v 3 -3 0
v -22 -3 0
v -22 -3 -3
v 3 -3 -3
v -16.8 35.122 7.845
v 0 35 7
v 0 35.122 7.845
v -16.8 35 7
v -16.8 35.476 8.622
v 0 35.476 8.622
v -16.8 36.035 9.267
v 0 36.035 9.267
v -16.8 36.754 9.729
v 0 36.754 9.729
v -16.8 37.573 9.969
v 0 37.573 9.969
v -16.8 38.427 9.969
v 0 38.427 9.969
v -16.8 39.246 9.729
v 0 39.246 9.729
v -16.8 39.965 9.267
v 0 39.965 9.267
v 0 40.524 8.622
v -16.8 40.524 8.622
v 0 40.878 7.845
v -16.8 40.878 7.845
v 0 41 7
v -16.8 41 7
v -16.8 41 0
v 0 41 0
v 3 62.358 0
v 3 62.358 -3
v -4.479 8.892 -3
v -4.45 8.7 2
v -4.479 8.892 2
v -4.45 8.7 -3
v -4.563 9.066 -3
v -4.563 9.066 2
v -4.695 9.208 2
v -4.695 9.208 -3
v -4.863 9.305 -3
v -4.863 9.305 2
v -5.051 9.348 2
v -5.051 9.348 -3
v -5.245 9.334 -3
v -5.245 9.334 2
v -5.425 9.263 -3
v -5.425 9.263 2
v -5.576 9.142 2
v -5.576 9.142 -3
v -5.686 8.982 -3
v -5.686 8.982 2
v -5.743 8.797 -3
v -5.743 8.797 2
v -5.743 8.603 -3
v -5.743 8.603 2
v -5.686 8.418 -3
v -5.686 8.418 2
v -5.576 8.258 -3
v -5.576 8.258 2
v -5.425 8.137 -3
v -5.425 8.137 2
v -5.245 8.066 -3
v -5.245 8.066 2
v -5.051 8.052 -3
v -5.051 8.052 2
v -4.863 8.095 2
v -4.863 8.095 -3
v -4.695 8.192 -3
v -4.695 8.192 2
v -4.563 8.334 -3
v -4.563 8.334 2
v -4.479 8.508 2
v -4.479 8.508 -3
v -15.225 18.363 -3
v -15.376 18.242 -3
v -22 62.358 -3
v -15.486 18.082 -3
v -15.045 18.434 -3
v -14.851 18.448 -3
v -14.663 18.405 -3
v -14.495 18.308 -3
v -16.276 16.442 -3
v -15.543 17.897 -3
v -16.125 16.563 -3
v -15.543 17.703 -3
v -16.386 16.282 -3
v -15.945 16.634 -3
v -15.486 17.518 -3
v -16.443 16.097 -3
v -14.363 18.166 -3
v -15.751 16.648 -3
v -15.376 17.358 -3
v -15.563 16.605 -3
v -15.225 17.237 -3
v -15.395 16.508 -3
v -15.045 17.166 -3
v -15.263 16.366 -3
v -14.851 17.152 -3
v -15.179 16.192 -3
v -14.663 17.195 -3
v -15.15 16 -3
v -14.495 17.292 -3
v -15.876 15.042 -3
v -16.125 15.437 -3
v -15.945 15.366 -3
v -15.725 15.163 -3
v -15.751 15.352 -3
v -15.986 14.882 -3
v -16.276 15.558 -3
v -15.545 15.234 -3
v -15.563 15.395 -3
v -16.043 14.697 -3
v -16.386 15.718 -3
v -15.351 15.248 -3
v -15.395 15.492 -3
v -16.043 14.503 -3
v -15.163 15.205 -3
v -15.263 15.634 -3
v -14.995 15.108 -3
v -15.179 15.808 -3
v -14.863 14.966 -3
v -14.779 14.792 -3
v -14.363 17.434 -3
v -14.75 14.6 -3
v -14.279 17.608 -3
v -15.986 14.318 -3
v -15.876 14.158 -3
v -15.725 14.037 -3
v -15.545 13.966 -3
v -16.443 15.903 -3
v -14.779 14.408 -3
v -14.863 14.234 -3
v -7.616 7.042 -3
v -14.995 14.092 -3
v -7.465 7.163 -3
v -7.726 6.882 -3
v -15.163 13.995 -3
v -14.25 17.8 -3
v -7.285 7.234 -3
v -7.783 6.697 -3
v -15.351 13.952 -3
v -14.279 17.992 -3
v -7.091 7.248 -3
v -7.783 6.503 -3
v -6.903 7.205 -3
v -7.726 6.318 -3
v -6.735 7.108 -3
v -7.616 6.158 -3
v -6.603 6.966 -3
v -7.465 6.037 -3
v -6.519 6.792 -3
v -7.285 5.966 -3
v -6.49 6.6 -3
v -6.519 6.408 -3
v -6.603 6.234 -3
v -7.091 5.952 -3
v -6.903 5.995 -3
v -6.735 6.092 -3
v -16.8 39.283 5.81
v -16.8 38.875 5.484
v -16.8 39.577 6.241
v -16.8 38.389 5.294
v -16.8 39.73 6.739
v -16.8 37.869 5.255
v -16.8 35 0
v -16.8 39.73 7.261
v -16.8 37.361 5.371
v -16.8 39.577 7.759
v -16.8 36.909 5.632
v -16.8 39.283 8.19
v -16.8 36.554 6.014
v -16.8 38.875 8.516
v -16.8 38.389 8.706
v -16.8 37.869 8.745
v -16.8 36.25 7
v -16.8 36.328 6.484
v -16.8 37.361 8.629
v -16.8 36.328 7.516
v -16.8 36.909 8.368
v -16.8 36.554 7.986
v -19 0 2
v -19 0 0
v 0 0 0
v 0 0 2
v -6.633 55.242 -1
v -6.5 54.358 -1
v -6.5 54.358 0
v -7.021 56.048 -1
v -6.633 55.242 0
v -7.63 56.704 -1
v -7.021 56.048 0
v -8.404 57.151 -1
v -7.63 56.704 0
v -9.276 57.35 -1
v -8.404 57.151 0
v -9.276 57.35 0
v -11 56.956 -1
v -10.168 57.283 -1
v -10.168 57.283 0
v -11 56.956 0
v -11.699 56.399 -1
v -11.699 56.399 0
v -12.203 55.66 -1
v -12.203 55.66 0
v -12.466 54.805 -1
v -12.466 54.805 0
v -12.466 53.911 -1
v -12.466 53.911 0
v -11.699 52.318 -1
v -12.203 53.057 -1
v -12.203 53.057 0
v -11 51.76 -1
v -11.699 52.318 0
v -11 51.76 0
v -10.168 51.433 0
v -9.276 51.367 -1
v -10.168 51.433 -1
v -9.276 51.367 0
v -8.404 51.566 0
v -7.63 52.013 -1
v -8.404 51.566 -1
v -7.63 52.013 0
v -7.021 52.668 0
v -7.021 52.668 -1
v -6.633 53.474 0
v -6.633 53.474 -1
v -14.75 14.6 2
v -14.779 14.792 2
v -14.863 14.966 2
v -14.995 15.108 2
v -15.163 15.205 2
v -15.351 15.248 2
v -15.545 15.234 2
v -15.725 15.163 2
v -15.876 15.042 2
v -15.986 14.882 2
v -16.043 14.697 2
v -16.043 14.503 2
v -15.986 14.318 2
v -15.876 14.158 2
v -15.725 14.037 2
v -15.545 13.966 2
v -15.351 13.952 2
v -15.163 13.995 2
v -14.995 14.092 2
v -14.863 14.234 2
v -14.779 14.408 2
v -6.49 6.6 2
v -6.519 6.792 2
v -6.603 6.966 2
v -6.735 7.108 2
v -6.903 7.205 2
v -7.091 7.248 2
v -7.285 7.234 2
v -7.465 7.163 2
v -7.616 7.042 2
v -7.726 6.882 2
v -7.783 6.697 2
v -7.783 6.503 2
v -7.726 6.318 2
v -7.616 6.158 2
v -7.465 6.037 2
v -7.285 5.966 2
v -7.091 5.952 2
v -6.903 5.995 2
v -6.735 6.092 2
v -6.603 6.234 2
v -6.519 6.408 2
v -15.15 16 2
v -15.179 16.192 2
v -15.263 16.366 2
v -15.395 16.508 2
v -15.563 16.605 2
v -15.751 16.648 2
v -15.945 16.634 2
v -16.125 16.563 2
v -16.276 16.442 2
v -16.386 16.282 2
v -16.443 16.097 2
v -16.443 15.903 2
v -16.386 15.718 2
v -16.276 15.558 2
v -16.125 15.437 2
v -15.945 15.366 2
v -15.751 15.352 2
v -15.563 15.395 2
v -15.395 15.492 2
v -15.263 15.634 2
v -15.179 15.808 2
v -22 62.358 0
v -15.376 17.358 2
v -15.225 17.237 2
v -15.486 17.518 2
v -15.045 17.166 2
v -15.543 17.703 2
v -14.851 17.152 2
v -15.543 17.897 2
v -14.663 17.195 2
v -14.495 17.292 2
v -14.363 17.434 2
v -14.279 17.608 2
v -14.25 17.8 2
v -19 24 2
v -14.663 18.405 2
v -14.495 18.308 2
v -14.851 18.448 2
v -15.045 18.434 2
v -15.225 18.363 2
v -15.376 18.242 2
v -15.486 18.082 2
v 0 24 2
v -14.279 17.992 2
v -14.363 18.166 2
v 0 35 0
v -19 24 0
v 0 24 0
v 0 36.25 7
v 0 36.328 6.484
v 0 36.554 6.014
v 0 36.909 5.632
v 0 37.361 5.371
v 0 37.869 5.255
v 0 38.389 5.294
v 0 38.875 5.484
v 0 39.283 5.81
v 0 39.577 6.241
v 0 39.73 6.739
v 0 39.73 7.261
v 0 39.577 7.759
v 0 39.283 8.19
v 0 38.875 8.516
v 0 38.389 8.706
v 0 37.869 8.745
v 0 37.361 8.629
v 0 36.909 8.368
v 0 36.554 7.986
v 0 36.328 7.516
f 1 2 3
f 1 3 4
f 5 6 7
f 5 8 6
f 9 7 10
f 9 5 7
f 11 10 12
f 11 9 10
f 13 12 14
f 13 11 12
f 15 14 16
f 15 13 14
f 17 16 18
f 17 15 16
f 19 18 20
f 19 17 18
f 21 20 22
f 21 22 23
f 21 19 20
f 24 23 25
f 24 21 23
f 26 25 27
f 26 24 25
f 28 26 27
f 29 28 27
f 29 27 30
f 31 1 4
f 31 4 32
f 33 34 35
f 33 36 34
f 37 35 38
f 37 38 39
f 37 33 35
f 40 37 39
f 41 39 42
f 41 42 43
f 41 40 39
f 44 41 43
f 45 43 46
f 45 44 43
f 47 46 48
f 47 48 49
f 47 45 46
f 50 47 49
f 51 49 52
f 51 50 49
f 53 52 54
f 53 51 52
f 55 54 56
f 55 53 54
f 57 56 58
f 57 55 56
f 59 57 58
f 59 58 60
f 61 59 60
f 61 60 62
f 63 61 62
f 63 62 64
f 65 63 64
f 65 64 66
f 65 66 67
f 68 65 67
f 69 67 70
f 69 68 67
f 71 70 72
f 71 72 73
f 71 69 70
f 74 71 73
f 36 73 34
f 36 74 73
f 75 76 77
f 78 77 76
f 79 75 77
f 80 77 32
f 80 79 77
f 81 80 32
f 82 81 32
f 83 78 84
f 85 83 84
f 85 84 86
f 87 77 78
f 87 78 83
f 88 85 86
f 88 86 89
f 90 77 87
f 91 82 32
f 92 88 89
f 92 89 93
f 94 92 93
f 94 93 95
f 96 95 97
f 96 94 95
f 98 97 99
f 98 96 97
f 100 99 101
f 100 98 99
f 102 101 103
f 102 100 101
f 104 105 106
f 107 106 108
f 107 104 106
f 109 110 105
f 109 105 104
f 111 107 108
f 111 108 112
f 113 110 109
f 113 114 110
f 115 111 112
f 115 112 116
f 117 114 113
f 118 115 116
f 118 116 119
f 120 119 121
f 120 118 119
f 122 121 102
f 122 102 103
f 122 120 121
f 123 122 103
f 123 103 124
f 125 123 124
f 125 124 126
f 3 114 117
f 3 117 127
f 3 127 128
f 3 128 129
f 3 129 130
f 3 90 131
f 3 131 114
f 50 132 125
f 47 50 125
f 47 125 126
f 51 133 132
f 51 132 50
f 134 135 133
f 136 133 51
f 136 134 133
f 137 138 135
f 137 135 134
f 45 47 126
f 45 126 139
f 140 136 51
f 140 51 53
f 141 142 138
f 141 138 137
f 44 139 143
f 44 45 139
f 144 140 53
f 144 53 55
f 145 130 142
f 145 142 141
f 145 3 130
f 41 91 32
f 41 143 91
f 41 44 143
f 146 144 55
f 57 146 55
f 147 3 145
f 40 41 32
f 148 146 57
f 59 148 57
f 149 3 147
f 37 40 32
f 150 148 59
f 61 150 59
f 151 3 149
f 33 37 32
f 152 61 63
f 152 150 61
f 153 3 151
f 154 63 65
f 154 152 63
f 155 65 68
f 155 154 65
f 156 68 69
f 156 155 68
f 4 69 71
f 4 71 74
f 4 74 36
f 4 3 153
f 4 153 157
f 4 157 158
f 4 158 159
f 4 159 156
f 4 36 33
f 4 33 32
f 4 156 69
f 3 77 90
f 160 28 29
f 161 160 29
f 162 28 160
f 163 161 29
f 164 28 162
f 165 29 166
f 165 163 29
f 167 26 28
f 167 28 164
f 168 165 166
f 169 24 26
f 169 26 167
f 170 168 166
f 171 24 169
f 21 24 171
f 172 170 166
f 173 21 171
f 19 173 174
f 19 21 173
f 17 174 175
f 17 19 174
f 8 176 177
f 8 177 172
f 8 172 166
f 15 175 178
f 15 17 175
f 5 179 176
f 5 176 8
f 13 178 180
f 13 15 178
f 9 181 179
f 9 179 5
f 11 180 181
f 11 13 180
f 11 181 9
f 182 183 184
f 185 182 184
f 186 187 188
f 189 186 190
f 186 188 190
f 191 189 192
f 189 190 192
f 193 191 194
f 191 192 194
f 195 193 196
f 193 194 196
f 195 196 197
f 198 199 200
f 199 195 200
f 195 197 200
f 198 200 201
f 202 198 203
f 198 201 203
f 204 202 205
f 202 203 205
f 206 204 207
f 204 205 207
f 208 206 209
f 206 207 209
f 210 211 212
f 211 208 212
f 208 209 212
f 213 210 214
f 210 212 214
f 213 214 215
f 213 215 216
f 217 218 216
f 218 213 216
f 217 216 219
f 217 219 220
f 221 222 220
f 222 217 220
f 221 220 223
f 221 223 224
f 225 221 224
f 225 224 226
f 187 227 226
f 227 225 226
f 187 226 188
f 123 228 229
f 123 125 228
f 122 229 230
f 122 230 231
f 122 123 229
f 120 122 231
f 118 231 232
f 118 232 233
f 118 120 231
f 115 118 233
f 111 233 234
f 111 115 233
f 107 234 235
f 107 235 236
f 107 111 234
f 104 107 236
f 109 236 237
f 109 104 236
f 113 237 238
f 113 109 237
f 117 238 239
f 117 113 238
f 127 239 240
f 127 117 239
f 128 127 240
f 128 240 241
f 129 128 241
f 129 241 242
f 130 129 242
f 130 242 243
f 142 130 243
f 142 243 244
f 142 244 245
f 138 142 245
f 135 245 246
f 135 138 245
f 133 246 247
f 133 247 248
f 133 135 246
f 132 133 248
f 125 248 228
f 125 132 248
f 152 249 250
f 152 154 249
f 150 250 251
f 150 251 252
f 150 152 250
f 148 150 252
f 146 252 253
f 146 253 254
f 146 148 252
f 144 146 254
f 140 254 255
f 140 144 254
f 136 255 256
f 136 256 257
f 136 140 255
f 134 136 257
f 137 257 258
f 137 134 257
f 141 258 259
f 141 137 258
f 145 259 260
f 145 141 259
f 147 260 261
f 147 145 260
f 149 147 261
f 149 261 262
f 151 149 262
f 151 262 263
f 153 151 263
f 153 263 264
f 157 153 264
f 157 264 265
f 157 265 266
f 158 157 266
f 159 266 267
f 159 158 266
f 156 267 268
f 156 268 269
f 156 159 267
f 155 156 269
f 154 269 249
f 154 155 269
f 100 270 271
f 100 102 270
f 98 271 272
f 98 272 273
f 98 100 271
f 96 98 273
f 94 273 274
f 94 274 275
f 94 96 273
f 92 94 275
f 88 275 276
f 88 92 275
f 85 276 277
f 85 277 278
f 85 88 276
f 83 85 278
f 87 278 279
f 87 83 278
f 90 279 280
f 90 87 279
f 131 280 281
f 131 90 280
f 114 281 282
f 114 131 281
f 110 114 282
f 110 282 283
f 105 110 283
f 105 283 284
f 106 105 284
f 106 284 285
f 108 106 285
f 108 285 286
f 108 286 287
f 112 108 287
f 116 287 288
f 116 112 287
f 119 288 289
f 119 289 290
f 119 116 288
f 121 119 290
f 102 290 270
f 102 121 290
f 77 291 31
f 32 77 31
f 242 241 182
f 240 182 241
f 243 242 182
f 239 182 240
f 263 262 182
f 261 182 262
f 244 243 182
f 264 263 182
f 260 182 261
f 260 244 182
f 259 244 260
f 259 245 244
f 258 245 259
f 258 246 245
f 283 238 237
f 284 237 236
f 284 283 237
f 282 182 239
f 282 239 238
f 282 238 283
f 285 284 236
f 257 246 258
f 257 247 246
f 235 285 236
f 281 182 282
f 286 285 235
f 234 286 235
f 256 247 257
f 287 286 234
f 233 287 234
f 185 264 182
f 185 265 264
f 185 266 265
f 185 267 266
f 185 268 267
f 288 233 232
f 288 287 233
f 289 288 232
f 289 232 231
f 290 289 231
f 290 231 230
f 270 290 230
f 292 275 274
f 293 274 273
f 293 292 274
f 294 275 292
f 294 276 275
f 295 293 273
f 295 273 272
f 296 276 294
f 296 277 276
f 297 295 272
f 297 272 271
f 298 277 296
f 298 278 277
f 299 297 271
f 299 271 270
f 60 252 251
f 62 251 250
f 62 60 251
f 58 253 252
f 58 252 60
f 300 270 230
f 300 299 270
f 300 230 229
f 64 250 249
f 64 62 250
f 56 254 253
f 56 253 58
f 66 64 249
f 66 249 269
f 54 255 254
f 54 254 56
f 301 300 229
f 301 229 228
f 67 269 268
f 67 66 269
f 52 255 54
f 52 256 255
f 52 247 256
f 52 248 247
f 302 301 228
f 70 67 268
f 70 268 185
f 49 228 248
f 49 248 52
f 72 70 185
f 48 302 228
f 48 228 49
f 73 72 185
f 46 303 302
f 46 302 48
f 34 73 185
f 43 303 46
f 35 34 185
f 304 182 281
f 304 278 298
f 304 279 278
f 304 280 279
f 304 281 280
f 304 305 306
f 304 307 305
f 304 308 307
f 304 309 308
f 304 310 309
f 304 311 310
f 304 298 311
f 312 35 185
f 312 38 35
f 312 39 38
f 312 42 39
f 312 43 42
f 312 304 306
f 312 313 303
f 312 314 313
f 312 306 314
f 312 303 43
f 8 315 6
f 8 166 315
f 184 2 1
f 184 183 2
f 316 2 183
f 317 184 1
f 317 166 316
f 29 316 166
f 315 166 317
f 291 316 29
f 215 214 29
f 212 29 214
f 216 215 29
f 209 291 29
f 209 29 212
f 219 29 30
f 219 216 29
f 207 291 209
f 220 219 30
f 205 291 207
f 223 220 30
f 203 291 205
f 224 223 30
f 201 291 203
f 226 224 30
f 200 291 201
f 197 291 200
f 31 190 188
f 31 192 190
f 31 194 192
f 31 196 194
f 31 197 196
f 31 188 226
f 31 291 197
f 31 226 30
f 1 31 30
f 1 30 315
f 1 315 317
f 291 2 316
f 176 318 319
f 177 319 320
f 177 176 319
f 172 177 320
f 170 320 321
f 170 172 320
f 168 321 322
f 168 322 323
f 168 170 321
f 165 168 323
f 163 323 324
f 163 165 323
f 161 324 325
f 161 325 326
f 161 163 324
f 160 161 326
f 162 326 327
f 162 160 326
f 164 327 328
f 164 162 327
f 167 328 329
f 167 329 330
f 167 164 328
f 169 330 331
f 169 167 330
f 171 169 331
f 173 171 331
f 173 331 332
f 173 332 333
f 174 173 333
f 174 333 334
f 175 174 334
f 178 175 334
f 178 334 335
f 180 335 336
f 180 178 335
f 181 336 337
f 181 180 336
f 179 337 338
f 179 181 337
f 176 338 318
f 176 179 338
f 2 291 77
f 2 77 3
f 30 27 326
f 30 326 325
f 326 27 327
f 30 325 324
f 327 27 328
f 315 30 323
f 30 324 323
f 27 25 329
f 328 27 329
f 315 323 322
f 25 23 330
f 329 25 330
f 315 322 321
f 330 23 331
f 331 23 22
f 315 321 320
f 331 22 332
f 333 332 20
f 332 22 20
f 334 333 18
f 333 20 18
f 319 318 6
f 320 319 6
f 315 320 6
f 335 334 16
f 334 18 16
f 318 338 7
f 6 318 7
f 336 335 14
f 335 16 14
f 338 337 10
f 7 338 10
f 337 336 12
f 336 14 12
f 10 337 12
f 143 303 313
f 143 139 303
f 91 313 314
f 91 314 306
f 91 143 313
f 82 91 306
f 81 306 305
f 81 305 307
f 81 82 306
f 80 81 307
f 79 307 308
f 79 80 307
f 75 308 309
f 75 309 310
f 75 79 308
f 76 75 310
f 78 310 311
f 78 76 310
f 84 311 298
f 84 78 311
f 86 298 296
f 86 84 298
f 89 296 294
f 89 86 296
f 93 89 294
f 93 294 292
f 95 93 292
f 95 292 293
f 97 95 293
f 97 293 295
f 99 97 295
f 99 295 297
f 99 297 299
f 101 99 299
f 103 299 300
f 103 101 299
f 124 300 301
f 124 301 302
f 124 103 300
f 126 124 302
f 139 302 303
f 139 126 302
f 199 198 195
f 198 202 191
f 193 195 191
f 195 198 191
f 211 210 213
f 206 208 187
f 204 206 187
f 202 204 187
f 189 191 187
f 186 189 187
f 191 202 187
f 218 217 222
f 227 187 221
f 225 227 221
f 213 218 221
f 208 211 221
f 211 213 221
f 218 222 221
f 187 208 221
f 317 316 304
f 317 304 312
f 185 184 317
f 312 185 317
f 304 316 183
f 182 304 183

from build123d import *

# Parameters (mm, degrees)
F0_W     = 4.1414871812
F0_H     = 3
F0_W_2   = 25
F0_H_2   = 35.3582080007
F0_R     = 3
F0_W_3   = 3.0508699417
F0_W_4   = 6.3956826925
F0_W_5   = 5.4119601846
F0_W_6   = 19
F0_H_3   = 13.8665742949
F0_R_2   = 0.65
F1_DEPTH = 3
F2_DEPTH = 2
F6_DEPTH = 15.5
F7_R     = 3
F8_DEPTH = 2
F9_DEPTH = 1.3


with BuildPart() as f1:
    # F0 (on Top) → F1 (new body)
    with BuildSketch(Plane.XY):
        with Locations((-2.0707435906, -1.5)):
            Rectangle(F0_W, F0_H)
        with Locations((-9.5, 44.6791040003)):
            Rectangle(F0_W_2, F0_H_2)
        with Locations((-9.5, 54.3582080007)):
            Circle(F0_R, mode=Mode.SUBTRACT)
        with Locations((-17.4745650291, -1.5)):
            Rectangle(F0_W_3, F0_H)
        with Locations((-7.3393285275, -1.5)):
            Rectangle(F0_W_4, F0_H)
        Polygon((0, 10.1334257051), (0, 0), (0, -3), (3, -3), (3, 27), (-22, 27), (-22, -3), (-19, -3), (-19, 0), (-19, 10.1334257051), (-19, 24), (0, 24), align=None)
        with Locations((-13.243149966, -1.5)):
            Rectangle(F0_W_5, F0_H)
        with Locations((-9.5, 17.0667128526)):
            Rectangle(F0_W_6, F0_H_3)
        with Locations((-15.8, 16)):
            Circle(F0_R_2, mode=Mode.SUBTRACT)
        with Locations((-15.4, 14.6)):
            Circle(F0_R_2, mode=Mode.SUBTRACT)
        with Locations((-14.9, 17.8)):
            Circle(F0_R_2, mode=Mode.SUBTRACT)
        Polygon((-4.1414871812, 0), (0, 0), (0, 10.1334257051), (-19, 10.1334257051), (-19, 0), (-15.9491300583, 0), (-10.5371698737, 0), align=None)
        with Locations((-7.14, 6.6)):
            Circle(F0_R_2, mode=Mode.SUBTRACT)
        with Locations((-5.1, 8.7)):
            Circle(F0_R_2, mode=Mode.SUBTRACT)
    extrude(amount=-F1_DEPTH)

    # F0 (on Top) → F2 (join)
    with BuildSketch(Plane.XY):
        with Locations((-9.5, 17.0667128526)):
            Rectangle(F0_W_6, F0_H_3)
        with Locations((-15.8, 16)):
            Circle(F0_R_2, mode=Mode.SUBTRACT)
        with Locations((-15.4, 14.6)):
            Circle(F0_R_2, mode=Mode.SUBTRACT)
        with Locations((-14.9, 17.8)):
            Circle(F0_R_2, mode=Mode.SUBTRACT)
        Polygon((-4.1414871812, 0), (0, 0), (0, 10.1334257051), (-19, 10.1334257051), (-19, 0), (-15.9491300583, 0), (-10.5371698737, 0), align=None)
        with Locations((-7.14, 6.6)):
            Circle(F0_R_2, mode=Mode.SUBTRACT)
        with Locations((-5.1, 8.7)):
            Circle(F0_R_2, mode=Mode.SUBTRACT)
    extrude(amount=F2_DEPTH)

    # F5 (on offset) → F6 (join)
    with BuildSketch(Plane(origin=(-16.8, 0, 0), x_dir=(0, -1, 0), z_dir=(-1, 0, 0))):
        with BuildLine():
            ThreePointArc((-35, 7), (-38, 10), (-41, 7))
            Line((-41, 7), (-39.75, 7))
            ThreePointArc((-39.75, 7), (-38, 8.75), (-36.25, 7))
            Line((-36.25, 7), (-35, 7))
        make_face()
        with BuildLine():
            Line((-41, 7), (-41, 0))
            Line((-41, 0), (-35, 0))
            Line((-35, 0), (-35, 7))
            Line((-35, 7), (-36.25, 7))
            ThreePointArc((-36.25, 7), (-38, 5.25), (-39.75, 7))
            Line((-39.75, 7), (-41, 7))
        make_face()
    extrude(amount=-F6_DEPTH)

    # F7 (on face) → F8 (join)
    with BuildSketch(Plane(origin=(0, 0, -3), x_dir=(1, 0, 0), z_dir=(0, 0, -1))):
        with Locations((-9.5, -54.3582080007)):
            Circle(F7_R)
    extrude(amount=-F8_DEPTH)

    # F9 (add): a face of the model
    f9_faces = [f1.faces().sort_by_distance(p)[0] for p in [
        (-1.3, 38, 4.2267630358),
    ]]
    extrude(f9_faces, amount=F9_DEPTH)


solid = f1.part
